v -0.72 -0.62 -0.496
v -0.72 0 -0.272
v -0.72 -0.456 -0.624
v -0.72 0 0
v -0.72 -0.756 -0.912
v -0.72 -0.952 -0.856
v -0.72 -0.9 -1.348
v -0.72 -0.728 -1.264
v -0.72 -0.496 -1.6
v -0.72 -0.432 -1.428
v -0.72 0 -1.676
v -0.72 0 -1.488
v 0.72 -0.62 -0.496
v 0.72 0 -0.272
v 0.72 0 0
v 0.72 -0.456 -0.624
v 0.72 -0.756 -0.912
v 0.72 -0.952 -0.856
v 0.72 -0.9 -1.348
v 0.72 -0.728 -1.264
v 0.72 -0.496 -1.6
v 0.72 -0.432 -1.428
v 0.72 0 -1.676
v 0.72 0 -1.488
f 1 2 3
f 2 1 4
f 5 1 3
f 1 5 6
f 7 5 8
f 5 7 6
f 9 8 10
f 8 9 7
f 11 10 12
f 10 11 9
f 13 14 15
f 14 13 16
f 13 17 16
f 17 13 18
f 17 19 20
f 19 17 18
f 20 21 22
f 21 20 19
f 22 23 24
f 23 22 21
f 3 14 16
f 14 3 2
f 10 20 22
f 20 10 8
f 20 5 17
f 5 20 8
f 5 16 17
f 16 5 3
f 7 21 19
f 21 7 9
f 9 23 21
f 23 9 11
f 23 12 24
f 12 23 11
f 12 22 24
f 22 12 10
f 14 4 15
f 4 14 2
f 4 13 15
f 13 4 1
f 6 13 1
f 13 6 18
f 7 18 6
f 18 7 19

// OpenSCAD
// file: ../p/rect.scad
use <../lib.scad>
function ldraw_lib__rect() = [
// 0 Rectangle
// 0 Name: rect.dat
// 0 Author: James Jessiman
// 0 !LDRAW_ORG Primitive UPDATE 2010-01
// 0 !LICENSE Licensed under CC BY 4.0 : see CAreadme.txt
// 
// 0 BFC CERTIFY CCW
  [0,"BFC","CERTIFY"],
  [0,"BFC","CCW"],
// 
// 0 !HISTORY 2002-04-05 [hafhead] Added BFC statement
// 0 !HISTORY 2002-04-25 [PTadmin] Official Update 2002-02
// 0 !HISTORY 2007-06-24 [PTadmin] Header formatted for Contributor Agreement
// 0 !HISTORY 2008-07-01 [PTadmin] Official Update 2008-01
// 0 !HISTORY 2010-01-17 [mikeheide] changed winding to CCW
// 0 !HISTORY 2010-04-05 [PTadmin] Official Update 2010-01
// 
// 
// 2 24 1 0 1 -1 0 1
  [2,24,1,0,1,-1,0,1],
// 2 24 -1 0 1 -1 0 -1
  [2,24,-1,0,1,-1,0,-1],
// 2 24 -1 0 -1 1 0 -1
  [2,24,-1,0,-1,1,0,-1],
// 2 24 1 0 -1 1 0 1
  [2,24,1,0,-1,1,0,1],
// 4 16 -1 0 1 -1 0 -1 1 0 -1 1 0 1
  [4,16,-1,0,1,-1,0,-1,1,0,-1,1,0,1],
// 0
];
module ldraw_lib__rect(step=0, col=false, unit=2/5, alt=false, line=0.2, solid=!$preview)
    makepoly(ldraw_lib__rect(), step=step, col=col, unit=unit, alt=alt, line=line, solid=solid);
ldraw_lib__rect(line=0.2);
// main file
use <../lib.scad>
use <../p/rect.scad>
function ldraw_lib__u9118() = [
// 0 ~Electric Hub Mario Body Pant Id Switch
// 0 Name: u9118.dat
// 0 Author: Philippe Hurbain [Philo]
// 0 !LDRAW_ORG Part UPDATE 2023-06
// 0 !LICENSE Licensed under CC BY 4.0 : see CAreadme.txt
// 
// 0 BFC CERTIFY CCW
  [0,"BFC","CERTIFY"],
  [0,"BFC","CCW"],
// 
// 0 !HISTORY 2023-11-19 [OrionP] Official Update 2023-06
// 
// 
// 4 16 -1.8 0.68 0 -1.8 1.56 -1.14 -1.8 1.24 -1.55 -1.8 0 0
  [4,16,-1.8,0.68,0,-1.8,1.56,-1.14,-1.8,1.24,-1.55,-1.8,0,0],
// 4 16 -1.8 1.24 -1.55 -1.8 1.56 -1.14 -1.8 2.28 -1.89 -1.8 2.14 -2.38
  [4,16,-1.8,1.24,-1.55,-1.8,1.56,-1.14,-1.8,2.28,-1.89,-1.8,2.14,-2.38],
// 4 16 -1.8 3.37 -2.25 -1.8 2.14 -2.38 -1.8 2.28 -1.89 -1.8 3.16 -1.82
  [4,16,-1.8,3.37,-2.25,-1.8,2.14,-2.38,-1.8,2.28,-1.89,-1.8,3.16,-1.82],
// 4 16 -1.8 4 -1.24 -1.8 3.37 -2.25 -1.8 3.16 -1.82 -1.8 3.57 -1.08
  [4,16,-1.8,4,-1.24,-1.8,3.37,-2.25,-1.8,3.16,-1.82,-1.8,3.57,-1.08],
// 4 16 -1.8 3.57 -1.08 -1.8 3.72 0 -1.8 4.19 0 -1.8 4 -1.24
  [4,16,-1.8,3.57,-1.08,-1.8,3.72,0,-1.8,4.19,0,-1.8,4,-1.24],
// 2 24 -1.8 0 0 -1.8 1.24 -1.55
  [2,24,-1.8,0,0,-1.8,1.24,-1.55],
// 2 24 -1.8 1.24 -1.55 -1.8 2.14 -2.38
  [2,24,-1.8,1.24,-1.55,-1.8,2.14,-2.38],
// 2 24 -1.8 2.14 -2.38 -1.8 3.37 -2.25
  [2,24,-1.8,2.14,-2.38,-1.8,3.37,-2.25],
// 2 24 -1.8 3.37 -2.25 -1.8 4 -1.24
  [2,24,-1.8,3.37,-2.25,-1.8,4,-1.24],
// 2 24 -1.8 4 -1.24 -1.8 4.19 0
  [2,24,-1.8,4,-1.24,-1.8,4.19,0],
// 2 24 -1.8 0.68 0 -1.8 1.56 -1.14
  [2,24,-1.8,0.68,0,-1.8,1.56,-1.14],
// 2 24 -1.8 1.56 -1.14 -1.8 2.28 -1.89
  [2,24,-1.8,1.56,-1.14,-1.8,2.28,-1.89],
// 2 24 -1.8 2.28 -1.89 -1.8 3.16 -1.82
  [2,24,-1.8,2.28,-1.89,-1.8,3.16,-1.82],
// 2 24 -1.8 3.16 -1.82 -1.8 3.57 -1.08
  [2,24,-1.8,3.16,-1.82,-1.8,3.57,-1.08],
// 2 24 -1.8 3.57 -1.08 -1.8 3.72 0
  [2,24,-1.8,3.57,-1.08,-1.8,3.72,0],
// 4 16 1.8 1.24 -1.55 1.8 1.56 -1.14 1.8 0.68 0 1.8 0 0
  [4,16,1.8,1.24,-1.55,1.8,1.56,-1.14,1.8,0.68,0,1.8,0,0],
// 4 16 1.8 2.28 -1.89 1.8 1.56 -1.14 1.8 1.24 -1.55 1.8 2.14 -2.38
  [4,16,1.8,2.28,-1.89,1.8,1.56,-1.14,1.8,1.24,-1.55,1.8,2.14,-2.38],
// 4 16 1.8 2.28 -1.89 1.8 2.14 -2.38 1.8 3.37 -2.25 1.8 3.16 -1.82
  [4,16,1.8,2.28,-1.89,1.8,2.14,-2.38,1.8,3.37,-2.25,1.8,3.16,-1.82],
// 4 16 1.8 3.16 -1.82 1.8 3.37 -2.25 1.8 4 -1.24 1.8 3.57 -1.08
  [4,16,1.8,3.16,-1.82,1.8,3.37,-2.25,1.8,4,-1.24,1.8,3.57,-1.08],
// 4 16 1.8 4.19 0 1.8 3.72 0 1.8 3.57 -1.08 1.8 4 -1.24
  [4,16,1.8,4.19,0,1.8,3.72,0,1.8,3.57,-1.08,1.8,4,-1.24],
// 2 24 1.8 0 0 1.8 1.24 -1.55
  [2,24,1.8,0,0,1.8,1.24,-1.55],
// 2 24 1.8 1.24 -1.55 1.8 2.14 -2.38
  [2,24,1.8,1.24,-1.55,1.8,2.14,-2.38],
// 2 24 1.8 2.14 -2.38 1.8 3.37 -2.25
  [2,24,1.8,2.14,-2.38,1.8,3.37,-2.25],
// 2 24 1.8 3.37 -2.25 1.8 4 -1.24
  [2,24,1.8,3.37,-2.25,1.8,4,-1.24],
// 2 24 1.8 4 -1.24 1.8 4.19 0
  [2,24,1.8,4,-1.24,1.8,4.19,0],
// 2 24 1.8 0.68 0 1.8 1.56 -1.14
  [2,24,1.8,0.68,0,1.8,1.56,-1.14],
// 2 24 1.8 1.56 -1.14 1.8 2.28 -1.89
  [2,24,1.8,1.56,-1.14,1.8,2.28,-1.89],
// 2 24 1.8 2.28 -1.89 1.8 3.16 -1.82
  [2,24,1.8,2.28,-1.89,1.8,3.16,-1.82],
// 2 24 1.8 3.16 -1.82 1.8 3.57 -1.08
  [2,24,1.8,3.16,-1.82,1.8,3.57,-1.08],
// 2 24 1.8 3.57 -1.08 1.8 3.72 0
  [2,24,1.8,3.57,-1.08,1.8,3.72,0],
// 4 16 1.8 0.68 0 1.8 1.56 -1.14 -1.8 1.56 -1.14 -1.8 0.68 0
  [4,16,1.8,0.68,0,1.8,1.56,-1.14,-1.8,1.56,-1.14,-1.8,0.68,0],
// 4 16 1.8 3.16 -1.82 1.8 3.57 -1.08 -1.8 3.57 -1.08 -1.8 3.16 -1.82
  [4,16,1.8,3.16,-1.82,1.8,3.57,-1.08,-1.8,3.57,-1.08,-1.8,3.16,-1.82],
// 4 16 1.8 2.28 -1.89 1.8 3.16 -1.82 -1.8 3.16 -1.82 -1.8 2.28 -1.89
  [4,16,1.8,2.28,-1.89,1.8,3.16,-1.82,-1.8,3.16,-1.82,-1.8,2.28,-1.89],
// 4 16 1.8 1.56 -1.14 1.8 2.28 -1.89 -1.8 2.28 -1.89 -1.8 1.56 -1.14
  [4,16,1.8,1.56,-1.14,1.8,2.28,-1.89,-1.8,2.28,-1.89,-1.8,1.56,-1.14],
// 4 16 1.8 4 -1.24 1.8 3.37 -2.25 -1.8 3.37 -2.25 -1.8 4 -1.24
  [4,16,1.8,4,-1.24,1.8,3.37,-2.25,-1.8,3.37,-2.25,-1.8,4,-1.24],
// 4 16 1.8 4.19 0 1.8 4 -1.24 -1.8 4 -1.24 -1.8 4.19 0
  [4,16,1.8,4.19,0,1.8,4,-1.24,-1.8,4,-1.24,-1.8,4.19,0],
// 1 16 0 3.955 0 0 0 -1.8 0.235 0 0 0 -1 0 rect.dat
  [1,16,0,3.955,0,0,0,-1.8,0.235,0,0,0,-1,0, ldraw_lib__rect()],
// 4 16 1.8 3.57 -1.08 1.8 3.72 0 -1.8 3.72 0 -1.8 3.57 -1.08
  [4,16,1.8,3.57,-1.08,1.8,3.72,0,-1.8,3.72,0,-1.8,3.57,-1.08],
// 1 16 0 0.34 0 0 0 -1.8 0.34 0 0 0 -1 0 rect.dat
  [1,16,0,0.34,0,0,0,-1.8,0.34,0,0,0,-1,0, ldraw_lib__rect()],
// 4 16 1.8 1.24 -1.55 1.8 0 0 -1.8 0 0 -1.8 1.24 -1.55
  [4,16,1.8,1.24,-1.55,1.8,0,0,-1.8,0,0,-1.8,1.24,-1.55],
// 4 16 1.8 2.14 -2.38 1.8 1.24 -1.55 -1.8 1.24 -1.55 -1.8 2.14 -2.38
  [4,16,1.8,2.14,-2.38,1.8,1.24,-1.55,-1.8,1.24,-1.55,-1.8,2.14,-2.38],
// 4 16 1.8 3.37 -2.25 1.8 2.14 -2.38 -1.8 2.14 -2.38 -1.8 3.37 -2.25
  [4,16,1.8,3.37,-2.25,1.8,2.14,-2.38,-1.8,2.14,-2.38,-1.8,3.37,-2.25],
// 5 24 1.8 3.57 -1.08 -1.8 3.57 -1.08 1.8 3.72 0 1.8 3.16 -1.82
  [5,24,1.8,3.57,-1.08,-1.8,3.57,-1.08,1.8,3.72,0,1.8,3.16,-1.82],
// 5 24 1.8 3.16 -1.82 -1.8 3.16 -1.82 1.8 3.57 -1.08 1.8 2.28 -1.89
  [5,24,1.8,3.16,-1.82,-1.8,3.16,-1.82,1.8,3.57,-1.08,1.8,2.28,-1.89],
// 5 24 1.8 2.28 -1.89 -1.8 2.28 -1.89 1.8 3.16 -1.82 1.8 1.56 -1.14
  [5,24,1.8,2.28,-1.89,-1.8,2.28,-1.89,1.8,3.16,-1.82,1.8,1.56,-1.14],
// 5 24 1.8 3.37 -2.25 -1.8 3.37 -2.25 1.8 2.14 -2.38 1.8 4 -1.24
  [5,24,1.8,3.37,-2.25,-1.8,3.37,-2.25,1.8,2.14,-2.38,1.8,4,-1.24],
// 5 24 1.8 4 -1.24 -1.8 4 -1.24 1.8 3.37 -2.25 1.8 4.19 0
  [5,24,1.8,4,-1.24,-1.8,4,-1.24,1.8,3.37,-2.25,1.8,4.19,0],
// 5 24 1.8 1.24 -1.55 -1.8 1.24 -1.55 1.8 0 0 1.8 2.14 -2.38
  [5,24,1.8,1.24,-1.55,-1.8,1.24,-1.55,1.8,0,0,1.8,2.14,-2.38],
// 5 24 1.8 2.14 -2.38 -1.8 2.14 -2.38 1.8 1.24 -1.55 1.8 3.37 -2.25
  [5,24,1.8,2.14,-2.38,-1.8,2.14,-2.38,1.8,1.24,-1.55,1.8,3.37,-2.25],
// 5 24 1.8 1.56 -1.14 -1.8 1.56 -1.14 1.8 0.68 0 1.8 2.28 -1.89
  [5,24,1.8,1.56,-1.14,-1.8,1.56,-1.14,1.8,0.68,0,1.8,2.28,-1.89],
];
module ldraw_lib__u9118(step=0, col=false, unit=2/5, alt=false, line=0.2, solid=!$preview)
    makepoly(ldraw_lib__u9118(), step=step, col=col, unit=unit, alt=alt, line=line, solid=solid);
ldraw_lib__u9118(line=0.2);
